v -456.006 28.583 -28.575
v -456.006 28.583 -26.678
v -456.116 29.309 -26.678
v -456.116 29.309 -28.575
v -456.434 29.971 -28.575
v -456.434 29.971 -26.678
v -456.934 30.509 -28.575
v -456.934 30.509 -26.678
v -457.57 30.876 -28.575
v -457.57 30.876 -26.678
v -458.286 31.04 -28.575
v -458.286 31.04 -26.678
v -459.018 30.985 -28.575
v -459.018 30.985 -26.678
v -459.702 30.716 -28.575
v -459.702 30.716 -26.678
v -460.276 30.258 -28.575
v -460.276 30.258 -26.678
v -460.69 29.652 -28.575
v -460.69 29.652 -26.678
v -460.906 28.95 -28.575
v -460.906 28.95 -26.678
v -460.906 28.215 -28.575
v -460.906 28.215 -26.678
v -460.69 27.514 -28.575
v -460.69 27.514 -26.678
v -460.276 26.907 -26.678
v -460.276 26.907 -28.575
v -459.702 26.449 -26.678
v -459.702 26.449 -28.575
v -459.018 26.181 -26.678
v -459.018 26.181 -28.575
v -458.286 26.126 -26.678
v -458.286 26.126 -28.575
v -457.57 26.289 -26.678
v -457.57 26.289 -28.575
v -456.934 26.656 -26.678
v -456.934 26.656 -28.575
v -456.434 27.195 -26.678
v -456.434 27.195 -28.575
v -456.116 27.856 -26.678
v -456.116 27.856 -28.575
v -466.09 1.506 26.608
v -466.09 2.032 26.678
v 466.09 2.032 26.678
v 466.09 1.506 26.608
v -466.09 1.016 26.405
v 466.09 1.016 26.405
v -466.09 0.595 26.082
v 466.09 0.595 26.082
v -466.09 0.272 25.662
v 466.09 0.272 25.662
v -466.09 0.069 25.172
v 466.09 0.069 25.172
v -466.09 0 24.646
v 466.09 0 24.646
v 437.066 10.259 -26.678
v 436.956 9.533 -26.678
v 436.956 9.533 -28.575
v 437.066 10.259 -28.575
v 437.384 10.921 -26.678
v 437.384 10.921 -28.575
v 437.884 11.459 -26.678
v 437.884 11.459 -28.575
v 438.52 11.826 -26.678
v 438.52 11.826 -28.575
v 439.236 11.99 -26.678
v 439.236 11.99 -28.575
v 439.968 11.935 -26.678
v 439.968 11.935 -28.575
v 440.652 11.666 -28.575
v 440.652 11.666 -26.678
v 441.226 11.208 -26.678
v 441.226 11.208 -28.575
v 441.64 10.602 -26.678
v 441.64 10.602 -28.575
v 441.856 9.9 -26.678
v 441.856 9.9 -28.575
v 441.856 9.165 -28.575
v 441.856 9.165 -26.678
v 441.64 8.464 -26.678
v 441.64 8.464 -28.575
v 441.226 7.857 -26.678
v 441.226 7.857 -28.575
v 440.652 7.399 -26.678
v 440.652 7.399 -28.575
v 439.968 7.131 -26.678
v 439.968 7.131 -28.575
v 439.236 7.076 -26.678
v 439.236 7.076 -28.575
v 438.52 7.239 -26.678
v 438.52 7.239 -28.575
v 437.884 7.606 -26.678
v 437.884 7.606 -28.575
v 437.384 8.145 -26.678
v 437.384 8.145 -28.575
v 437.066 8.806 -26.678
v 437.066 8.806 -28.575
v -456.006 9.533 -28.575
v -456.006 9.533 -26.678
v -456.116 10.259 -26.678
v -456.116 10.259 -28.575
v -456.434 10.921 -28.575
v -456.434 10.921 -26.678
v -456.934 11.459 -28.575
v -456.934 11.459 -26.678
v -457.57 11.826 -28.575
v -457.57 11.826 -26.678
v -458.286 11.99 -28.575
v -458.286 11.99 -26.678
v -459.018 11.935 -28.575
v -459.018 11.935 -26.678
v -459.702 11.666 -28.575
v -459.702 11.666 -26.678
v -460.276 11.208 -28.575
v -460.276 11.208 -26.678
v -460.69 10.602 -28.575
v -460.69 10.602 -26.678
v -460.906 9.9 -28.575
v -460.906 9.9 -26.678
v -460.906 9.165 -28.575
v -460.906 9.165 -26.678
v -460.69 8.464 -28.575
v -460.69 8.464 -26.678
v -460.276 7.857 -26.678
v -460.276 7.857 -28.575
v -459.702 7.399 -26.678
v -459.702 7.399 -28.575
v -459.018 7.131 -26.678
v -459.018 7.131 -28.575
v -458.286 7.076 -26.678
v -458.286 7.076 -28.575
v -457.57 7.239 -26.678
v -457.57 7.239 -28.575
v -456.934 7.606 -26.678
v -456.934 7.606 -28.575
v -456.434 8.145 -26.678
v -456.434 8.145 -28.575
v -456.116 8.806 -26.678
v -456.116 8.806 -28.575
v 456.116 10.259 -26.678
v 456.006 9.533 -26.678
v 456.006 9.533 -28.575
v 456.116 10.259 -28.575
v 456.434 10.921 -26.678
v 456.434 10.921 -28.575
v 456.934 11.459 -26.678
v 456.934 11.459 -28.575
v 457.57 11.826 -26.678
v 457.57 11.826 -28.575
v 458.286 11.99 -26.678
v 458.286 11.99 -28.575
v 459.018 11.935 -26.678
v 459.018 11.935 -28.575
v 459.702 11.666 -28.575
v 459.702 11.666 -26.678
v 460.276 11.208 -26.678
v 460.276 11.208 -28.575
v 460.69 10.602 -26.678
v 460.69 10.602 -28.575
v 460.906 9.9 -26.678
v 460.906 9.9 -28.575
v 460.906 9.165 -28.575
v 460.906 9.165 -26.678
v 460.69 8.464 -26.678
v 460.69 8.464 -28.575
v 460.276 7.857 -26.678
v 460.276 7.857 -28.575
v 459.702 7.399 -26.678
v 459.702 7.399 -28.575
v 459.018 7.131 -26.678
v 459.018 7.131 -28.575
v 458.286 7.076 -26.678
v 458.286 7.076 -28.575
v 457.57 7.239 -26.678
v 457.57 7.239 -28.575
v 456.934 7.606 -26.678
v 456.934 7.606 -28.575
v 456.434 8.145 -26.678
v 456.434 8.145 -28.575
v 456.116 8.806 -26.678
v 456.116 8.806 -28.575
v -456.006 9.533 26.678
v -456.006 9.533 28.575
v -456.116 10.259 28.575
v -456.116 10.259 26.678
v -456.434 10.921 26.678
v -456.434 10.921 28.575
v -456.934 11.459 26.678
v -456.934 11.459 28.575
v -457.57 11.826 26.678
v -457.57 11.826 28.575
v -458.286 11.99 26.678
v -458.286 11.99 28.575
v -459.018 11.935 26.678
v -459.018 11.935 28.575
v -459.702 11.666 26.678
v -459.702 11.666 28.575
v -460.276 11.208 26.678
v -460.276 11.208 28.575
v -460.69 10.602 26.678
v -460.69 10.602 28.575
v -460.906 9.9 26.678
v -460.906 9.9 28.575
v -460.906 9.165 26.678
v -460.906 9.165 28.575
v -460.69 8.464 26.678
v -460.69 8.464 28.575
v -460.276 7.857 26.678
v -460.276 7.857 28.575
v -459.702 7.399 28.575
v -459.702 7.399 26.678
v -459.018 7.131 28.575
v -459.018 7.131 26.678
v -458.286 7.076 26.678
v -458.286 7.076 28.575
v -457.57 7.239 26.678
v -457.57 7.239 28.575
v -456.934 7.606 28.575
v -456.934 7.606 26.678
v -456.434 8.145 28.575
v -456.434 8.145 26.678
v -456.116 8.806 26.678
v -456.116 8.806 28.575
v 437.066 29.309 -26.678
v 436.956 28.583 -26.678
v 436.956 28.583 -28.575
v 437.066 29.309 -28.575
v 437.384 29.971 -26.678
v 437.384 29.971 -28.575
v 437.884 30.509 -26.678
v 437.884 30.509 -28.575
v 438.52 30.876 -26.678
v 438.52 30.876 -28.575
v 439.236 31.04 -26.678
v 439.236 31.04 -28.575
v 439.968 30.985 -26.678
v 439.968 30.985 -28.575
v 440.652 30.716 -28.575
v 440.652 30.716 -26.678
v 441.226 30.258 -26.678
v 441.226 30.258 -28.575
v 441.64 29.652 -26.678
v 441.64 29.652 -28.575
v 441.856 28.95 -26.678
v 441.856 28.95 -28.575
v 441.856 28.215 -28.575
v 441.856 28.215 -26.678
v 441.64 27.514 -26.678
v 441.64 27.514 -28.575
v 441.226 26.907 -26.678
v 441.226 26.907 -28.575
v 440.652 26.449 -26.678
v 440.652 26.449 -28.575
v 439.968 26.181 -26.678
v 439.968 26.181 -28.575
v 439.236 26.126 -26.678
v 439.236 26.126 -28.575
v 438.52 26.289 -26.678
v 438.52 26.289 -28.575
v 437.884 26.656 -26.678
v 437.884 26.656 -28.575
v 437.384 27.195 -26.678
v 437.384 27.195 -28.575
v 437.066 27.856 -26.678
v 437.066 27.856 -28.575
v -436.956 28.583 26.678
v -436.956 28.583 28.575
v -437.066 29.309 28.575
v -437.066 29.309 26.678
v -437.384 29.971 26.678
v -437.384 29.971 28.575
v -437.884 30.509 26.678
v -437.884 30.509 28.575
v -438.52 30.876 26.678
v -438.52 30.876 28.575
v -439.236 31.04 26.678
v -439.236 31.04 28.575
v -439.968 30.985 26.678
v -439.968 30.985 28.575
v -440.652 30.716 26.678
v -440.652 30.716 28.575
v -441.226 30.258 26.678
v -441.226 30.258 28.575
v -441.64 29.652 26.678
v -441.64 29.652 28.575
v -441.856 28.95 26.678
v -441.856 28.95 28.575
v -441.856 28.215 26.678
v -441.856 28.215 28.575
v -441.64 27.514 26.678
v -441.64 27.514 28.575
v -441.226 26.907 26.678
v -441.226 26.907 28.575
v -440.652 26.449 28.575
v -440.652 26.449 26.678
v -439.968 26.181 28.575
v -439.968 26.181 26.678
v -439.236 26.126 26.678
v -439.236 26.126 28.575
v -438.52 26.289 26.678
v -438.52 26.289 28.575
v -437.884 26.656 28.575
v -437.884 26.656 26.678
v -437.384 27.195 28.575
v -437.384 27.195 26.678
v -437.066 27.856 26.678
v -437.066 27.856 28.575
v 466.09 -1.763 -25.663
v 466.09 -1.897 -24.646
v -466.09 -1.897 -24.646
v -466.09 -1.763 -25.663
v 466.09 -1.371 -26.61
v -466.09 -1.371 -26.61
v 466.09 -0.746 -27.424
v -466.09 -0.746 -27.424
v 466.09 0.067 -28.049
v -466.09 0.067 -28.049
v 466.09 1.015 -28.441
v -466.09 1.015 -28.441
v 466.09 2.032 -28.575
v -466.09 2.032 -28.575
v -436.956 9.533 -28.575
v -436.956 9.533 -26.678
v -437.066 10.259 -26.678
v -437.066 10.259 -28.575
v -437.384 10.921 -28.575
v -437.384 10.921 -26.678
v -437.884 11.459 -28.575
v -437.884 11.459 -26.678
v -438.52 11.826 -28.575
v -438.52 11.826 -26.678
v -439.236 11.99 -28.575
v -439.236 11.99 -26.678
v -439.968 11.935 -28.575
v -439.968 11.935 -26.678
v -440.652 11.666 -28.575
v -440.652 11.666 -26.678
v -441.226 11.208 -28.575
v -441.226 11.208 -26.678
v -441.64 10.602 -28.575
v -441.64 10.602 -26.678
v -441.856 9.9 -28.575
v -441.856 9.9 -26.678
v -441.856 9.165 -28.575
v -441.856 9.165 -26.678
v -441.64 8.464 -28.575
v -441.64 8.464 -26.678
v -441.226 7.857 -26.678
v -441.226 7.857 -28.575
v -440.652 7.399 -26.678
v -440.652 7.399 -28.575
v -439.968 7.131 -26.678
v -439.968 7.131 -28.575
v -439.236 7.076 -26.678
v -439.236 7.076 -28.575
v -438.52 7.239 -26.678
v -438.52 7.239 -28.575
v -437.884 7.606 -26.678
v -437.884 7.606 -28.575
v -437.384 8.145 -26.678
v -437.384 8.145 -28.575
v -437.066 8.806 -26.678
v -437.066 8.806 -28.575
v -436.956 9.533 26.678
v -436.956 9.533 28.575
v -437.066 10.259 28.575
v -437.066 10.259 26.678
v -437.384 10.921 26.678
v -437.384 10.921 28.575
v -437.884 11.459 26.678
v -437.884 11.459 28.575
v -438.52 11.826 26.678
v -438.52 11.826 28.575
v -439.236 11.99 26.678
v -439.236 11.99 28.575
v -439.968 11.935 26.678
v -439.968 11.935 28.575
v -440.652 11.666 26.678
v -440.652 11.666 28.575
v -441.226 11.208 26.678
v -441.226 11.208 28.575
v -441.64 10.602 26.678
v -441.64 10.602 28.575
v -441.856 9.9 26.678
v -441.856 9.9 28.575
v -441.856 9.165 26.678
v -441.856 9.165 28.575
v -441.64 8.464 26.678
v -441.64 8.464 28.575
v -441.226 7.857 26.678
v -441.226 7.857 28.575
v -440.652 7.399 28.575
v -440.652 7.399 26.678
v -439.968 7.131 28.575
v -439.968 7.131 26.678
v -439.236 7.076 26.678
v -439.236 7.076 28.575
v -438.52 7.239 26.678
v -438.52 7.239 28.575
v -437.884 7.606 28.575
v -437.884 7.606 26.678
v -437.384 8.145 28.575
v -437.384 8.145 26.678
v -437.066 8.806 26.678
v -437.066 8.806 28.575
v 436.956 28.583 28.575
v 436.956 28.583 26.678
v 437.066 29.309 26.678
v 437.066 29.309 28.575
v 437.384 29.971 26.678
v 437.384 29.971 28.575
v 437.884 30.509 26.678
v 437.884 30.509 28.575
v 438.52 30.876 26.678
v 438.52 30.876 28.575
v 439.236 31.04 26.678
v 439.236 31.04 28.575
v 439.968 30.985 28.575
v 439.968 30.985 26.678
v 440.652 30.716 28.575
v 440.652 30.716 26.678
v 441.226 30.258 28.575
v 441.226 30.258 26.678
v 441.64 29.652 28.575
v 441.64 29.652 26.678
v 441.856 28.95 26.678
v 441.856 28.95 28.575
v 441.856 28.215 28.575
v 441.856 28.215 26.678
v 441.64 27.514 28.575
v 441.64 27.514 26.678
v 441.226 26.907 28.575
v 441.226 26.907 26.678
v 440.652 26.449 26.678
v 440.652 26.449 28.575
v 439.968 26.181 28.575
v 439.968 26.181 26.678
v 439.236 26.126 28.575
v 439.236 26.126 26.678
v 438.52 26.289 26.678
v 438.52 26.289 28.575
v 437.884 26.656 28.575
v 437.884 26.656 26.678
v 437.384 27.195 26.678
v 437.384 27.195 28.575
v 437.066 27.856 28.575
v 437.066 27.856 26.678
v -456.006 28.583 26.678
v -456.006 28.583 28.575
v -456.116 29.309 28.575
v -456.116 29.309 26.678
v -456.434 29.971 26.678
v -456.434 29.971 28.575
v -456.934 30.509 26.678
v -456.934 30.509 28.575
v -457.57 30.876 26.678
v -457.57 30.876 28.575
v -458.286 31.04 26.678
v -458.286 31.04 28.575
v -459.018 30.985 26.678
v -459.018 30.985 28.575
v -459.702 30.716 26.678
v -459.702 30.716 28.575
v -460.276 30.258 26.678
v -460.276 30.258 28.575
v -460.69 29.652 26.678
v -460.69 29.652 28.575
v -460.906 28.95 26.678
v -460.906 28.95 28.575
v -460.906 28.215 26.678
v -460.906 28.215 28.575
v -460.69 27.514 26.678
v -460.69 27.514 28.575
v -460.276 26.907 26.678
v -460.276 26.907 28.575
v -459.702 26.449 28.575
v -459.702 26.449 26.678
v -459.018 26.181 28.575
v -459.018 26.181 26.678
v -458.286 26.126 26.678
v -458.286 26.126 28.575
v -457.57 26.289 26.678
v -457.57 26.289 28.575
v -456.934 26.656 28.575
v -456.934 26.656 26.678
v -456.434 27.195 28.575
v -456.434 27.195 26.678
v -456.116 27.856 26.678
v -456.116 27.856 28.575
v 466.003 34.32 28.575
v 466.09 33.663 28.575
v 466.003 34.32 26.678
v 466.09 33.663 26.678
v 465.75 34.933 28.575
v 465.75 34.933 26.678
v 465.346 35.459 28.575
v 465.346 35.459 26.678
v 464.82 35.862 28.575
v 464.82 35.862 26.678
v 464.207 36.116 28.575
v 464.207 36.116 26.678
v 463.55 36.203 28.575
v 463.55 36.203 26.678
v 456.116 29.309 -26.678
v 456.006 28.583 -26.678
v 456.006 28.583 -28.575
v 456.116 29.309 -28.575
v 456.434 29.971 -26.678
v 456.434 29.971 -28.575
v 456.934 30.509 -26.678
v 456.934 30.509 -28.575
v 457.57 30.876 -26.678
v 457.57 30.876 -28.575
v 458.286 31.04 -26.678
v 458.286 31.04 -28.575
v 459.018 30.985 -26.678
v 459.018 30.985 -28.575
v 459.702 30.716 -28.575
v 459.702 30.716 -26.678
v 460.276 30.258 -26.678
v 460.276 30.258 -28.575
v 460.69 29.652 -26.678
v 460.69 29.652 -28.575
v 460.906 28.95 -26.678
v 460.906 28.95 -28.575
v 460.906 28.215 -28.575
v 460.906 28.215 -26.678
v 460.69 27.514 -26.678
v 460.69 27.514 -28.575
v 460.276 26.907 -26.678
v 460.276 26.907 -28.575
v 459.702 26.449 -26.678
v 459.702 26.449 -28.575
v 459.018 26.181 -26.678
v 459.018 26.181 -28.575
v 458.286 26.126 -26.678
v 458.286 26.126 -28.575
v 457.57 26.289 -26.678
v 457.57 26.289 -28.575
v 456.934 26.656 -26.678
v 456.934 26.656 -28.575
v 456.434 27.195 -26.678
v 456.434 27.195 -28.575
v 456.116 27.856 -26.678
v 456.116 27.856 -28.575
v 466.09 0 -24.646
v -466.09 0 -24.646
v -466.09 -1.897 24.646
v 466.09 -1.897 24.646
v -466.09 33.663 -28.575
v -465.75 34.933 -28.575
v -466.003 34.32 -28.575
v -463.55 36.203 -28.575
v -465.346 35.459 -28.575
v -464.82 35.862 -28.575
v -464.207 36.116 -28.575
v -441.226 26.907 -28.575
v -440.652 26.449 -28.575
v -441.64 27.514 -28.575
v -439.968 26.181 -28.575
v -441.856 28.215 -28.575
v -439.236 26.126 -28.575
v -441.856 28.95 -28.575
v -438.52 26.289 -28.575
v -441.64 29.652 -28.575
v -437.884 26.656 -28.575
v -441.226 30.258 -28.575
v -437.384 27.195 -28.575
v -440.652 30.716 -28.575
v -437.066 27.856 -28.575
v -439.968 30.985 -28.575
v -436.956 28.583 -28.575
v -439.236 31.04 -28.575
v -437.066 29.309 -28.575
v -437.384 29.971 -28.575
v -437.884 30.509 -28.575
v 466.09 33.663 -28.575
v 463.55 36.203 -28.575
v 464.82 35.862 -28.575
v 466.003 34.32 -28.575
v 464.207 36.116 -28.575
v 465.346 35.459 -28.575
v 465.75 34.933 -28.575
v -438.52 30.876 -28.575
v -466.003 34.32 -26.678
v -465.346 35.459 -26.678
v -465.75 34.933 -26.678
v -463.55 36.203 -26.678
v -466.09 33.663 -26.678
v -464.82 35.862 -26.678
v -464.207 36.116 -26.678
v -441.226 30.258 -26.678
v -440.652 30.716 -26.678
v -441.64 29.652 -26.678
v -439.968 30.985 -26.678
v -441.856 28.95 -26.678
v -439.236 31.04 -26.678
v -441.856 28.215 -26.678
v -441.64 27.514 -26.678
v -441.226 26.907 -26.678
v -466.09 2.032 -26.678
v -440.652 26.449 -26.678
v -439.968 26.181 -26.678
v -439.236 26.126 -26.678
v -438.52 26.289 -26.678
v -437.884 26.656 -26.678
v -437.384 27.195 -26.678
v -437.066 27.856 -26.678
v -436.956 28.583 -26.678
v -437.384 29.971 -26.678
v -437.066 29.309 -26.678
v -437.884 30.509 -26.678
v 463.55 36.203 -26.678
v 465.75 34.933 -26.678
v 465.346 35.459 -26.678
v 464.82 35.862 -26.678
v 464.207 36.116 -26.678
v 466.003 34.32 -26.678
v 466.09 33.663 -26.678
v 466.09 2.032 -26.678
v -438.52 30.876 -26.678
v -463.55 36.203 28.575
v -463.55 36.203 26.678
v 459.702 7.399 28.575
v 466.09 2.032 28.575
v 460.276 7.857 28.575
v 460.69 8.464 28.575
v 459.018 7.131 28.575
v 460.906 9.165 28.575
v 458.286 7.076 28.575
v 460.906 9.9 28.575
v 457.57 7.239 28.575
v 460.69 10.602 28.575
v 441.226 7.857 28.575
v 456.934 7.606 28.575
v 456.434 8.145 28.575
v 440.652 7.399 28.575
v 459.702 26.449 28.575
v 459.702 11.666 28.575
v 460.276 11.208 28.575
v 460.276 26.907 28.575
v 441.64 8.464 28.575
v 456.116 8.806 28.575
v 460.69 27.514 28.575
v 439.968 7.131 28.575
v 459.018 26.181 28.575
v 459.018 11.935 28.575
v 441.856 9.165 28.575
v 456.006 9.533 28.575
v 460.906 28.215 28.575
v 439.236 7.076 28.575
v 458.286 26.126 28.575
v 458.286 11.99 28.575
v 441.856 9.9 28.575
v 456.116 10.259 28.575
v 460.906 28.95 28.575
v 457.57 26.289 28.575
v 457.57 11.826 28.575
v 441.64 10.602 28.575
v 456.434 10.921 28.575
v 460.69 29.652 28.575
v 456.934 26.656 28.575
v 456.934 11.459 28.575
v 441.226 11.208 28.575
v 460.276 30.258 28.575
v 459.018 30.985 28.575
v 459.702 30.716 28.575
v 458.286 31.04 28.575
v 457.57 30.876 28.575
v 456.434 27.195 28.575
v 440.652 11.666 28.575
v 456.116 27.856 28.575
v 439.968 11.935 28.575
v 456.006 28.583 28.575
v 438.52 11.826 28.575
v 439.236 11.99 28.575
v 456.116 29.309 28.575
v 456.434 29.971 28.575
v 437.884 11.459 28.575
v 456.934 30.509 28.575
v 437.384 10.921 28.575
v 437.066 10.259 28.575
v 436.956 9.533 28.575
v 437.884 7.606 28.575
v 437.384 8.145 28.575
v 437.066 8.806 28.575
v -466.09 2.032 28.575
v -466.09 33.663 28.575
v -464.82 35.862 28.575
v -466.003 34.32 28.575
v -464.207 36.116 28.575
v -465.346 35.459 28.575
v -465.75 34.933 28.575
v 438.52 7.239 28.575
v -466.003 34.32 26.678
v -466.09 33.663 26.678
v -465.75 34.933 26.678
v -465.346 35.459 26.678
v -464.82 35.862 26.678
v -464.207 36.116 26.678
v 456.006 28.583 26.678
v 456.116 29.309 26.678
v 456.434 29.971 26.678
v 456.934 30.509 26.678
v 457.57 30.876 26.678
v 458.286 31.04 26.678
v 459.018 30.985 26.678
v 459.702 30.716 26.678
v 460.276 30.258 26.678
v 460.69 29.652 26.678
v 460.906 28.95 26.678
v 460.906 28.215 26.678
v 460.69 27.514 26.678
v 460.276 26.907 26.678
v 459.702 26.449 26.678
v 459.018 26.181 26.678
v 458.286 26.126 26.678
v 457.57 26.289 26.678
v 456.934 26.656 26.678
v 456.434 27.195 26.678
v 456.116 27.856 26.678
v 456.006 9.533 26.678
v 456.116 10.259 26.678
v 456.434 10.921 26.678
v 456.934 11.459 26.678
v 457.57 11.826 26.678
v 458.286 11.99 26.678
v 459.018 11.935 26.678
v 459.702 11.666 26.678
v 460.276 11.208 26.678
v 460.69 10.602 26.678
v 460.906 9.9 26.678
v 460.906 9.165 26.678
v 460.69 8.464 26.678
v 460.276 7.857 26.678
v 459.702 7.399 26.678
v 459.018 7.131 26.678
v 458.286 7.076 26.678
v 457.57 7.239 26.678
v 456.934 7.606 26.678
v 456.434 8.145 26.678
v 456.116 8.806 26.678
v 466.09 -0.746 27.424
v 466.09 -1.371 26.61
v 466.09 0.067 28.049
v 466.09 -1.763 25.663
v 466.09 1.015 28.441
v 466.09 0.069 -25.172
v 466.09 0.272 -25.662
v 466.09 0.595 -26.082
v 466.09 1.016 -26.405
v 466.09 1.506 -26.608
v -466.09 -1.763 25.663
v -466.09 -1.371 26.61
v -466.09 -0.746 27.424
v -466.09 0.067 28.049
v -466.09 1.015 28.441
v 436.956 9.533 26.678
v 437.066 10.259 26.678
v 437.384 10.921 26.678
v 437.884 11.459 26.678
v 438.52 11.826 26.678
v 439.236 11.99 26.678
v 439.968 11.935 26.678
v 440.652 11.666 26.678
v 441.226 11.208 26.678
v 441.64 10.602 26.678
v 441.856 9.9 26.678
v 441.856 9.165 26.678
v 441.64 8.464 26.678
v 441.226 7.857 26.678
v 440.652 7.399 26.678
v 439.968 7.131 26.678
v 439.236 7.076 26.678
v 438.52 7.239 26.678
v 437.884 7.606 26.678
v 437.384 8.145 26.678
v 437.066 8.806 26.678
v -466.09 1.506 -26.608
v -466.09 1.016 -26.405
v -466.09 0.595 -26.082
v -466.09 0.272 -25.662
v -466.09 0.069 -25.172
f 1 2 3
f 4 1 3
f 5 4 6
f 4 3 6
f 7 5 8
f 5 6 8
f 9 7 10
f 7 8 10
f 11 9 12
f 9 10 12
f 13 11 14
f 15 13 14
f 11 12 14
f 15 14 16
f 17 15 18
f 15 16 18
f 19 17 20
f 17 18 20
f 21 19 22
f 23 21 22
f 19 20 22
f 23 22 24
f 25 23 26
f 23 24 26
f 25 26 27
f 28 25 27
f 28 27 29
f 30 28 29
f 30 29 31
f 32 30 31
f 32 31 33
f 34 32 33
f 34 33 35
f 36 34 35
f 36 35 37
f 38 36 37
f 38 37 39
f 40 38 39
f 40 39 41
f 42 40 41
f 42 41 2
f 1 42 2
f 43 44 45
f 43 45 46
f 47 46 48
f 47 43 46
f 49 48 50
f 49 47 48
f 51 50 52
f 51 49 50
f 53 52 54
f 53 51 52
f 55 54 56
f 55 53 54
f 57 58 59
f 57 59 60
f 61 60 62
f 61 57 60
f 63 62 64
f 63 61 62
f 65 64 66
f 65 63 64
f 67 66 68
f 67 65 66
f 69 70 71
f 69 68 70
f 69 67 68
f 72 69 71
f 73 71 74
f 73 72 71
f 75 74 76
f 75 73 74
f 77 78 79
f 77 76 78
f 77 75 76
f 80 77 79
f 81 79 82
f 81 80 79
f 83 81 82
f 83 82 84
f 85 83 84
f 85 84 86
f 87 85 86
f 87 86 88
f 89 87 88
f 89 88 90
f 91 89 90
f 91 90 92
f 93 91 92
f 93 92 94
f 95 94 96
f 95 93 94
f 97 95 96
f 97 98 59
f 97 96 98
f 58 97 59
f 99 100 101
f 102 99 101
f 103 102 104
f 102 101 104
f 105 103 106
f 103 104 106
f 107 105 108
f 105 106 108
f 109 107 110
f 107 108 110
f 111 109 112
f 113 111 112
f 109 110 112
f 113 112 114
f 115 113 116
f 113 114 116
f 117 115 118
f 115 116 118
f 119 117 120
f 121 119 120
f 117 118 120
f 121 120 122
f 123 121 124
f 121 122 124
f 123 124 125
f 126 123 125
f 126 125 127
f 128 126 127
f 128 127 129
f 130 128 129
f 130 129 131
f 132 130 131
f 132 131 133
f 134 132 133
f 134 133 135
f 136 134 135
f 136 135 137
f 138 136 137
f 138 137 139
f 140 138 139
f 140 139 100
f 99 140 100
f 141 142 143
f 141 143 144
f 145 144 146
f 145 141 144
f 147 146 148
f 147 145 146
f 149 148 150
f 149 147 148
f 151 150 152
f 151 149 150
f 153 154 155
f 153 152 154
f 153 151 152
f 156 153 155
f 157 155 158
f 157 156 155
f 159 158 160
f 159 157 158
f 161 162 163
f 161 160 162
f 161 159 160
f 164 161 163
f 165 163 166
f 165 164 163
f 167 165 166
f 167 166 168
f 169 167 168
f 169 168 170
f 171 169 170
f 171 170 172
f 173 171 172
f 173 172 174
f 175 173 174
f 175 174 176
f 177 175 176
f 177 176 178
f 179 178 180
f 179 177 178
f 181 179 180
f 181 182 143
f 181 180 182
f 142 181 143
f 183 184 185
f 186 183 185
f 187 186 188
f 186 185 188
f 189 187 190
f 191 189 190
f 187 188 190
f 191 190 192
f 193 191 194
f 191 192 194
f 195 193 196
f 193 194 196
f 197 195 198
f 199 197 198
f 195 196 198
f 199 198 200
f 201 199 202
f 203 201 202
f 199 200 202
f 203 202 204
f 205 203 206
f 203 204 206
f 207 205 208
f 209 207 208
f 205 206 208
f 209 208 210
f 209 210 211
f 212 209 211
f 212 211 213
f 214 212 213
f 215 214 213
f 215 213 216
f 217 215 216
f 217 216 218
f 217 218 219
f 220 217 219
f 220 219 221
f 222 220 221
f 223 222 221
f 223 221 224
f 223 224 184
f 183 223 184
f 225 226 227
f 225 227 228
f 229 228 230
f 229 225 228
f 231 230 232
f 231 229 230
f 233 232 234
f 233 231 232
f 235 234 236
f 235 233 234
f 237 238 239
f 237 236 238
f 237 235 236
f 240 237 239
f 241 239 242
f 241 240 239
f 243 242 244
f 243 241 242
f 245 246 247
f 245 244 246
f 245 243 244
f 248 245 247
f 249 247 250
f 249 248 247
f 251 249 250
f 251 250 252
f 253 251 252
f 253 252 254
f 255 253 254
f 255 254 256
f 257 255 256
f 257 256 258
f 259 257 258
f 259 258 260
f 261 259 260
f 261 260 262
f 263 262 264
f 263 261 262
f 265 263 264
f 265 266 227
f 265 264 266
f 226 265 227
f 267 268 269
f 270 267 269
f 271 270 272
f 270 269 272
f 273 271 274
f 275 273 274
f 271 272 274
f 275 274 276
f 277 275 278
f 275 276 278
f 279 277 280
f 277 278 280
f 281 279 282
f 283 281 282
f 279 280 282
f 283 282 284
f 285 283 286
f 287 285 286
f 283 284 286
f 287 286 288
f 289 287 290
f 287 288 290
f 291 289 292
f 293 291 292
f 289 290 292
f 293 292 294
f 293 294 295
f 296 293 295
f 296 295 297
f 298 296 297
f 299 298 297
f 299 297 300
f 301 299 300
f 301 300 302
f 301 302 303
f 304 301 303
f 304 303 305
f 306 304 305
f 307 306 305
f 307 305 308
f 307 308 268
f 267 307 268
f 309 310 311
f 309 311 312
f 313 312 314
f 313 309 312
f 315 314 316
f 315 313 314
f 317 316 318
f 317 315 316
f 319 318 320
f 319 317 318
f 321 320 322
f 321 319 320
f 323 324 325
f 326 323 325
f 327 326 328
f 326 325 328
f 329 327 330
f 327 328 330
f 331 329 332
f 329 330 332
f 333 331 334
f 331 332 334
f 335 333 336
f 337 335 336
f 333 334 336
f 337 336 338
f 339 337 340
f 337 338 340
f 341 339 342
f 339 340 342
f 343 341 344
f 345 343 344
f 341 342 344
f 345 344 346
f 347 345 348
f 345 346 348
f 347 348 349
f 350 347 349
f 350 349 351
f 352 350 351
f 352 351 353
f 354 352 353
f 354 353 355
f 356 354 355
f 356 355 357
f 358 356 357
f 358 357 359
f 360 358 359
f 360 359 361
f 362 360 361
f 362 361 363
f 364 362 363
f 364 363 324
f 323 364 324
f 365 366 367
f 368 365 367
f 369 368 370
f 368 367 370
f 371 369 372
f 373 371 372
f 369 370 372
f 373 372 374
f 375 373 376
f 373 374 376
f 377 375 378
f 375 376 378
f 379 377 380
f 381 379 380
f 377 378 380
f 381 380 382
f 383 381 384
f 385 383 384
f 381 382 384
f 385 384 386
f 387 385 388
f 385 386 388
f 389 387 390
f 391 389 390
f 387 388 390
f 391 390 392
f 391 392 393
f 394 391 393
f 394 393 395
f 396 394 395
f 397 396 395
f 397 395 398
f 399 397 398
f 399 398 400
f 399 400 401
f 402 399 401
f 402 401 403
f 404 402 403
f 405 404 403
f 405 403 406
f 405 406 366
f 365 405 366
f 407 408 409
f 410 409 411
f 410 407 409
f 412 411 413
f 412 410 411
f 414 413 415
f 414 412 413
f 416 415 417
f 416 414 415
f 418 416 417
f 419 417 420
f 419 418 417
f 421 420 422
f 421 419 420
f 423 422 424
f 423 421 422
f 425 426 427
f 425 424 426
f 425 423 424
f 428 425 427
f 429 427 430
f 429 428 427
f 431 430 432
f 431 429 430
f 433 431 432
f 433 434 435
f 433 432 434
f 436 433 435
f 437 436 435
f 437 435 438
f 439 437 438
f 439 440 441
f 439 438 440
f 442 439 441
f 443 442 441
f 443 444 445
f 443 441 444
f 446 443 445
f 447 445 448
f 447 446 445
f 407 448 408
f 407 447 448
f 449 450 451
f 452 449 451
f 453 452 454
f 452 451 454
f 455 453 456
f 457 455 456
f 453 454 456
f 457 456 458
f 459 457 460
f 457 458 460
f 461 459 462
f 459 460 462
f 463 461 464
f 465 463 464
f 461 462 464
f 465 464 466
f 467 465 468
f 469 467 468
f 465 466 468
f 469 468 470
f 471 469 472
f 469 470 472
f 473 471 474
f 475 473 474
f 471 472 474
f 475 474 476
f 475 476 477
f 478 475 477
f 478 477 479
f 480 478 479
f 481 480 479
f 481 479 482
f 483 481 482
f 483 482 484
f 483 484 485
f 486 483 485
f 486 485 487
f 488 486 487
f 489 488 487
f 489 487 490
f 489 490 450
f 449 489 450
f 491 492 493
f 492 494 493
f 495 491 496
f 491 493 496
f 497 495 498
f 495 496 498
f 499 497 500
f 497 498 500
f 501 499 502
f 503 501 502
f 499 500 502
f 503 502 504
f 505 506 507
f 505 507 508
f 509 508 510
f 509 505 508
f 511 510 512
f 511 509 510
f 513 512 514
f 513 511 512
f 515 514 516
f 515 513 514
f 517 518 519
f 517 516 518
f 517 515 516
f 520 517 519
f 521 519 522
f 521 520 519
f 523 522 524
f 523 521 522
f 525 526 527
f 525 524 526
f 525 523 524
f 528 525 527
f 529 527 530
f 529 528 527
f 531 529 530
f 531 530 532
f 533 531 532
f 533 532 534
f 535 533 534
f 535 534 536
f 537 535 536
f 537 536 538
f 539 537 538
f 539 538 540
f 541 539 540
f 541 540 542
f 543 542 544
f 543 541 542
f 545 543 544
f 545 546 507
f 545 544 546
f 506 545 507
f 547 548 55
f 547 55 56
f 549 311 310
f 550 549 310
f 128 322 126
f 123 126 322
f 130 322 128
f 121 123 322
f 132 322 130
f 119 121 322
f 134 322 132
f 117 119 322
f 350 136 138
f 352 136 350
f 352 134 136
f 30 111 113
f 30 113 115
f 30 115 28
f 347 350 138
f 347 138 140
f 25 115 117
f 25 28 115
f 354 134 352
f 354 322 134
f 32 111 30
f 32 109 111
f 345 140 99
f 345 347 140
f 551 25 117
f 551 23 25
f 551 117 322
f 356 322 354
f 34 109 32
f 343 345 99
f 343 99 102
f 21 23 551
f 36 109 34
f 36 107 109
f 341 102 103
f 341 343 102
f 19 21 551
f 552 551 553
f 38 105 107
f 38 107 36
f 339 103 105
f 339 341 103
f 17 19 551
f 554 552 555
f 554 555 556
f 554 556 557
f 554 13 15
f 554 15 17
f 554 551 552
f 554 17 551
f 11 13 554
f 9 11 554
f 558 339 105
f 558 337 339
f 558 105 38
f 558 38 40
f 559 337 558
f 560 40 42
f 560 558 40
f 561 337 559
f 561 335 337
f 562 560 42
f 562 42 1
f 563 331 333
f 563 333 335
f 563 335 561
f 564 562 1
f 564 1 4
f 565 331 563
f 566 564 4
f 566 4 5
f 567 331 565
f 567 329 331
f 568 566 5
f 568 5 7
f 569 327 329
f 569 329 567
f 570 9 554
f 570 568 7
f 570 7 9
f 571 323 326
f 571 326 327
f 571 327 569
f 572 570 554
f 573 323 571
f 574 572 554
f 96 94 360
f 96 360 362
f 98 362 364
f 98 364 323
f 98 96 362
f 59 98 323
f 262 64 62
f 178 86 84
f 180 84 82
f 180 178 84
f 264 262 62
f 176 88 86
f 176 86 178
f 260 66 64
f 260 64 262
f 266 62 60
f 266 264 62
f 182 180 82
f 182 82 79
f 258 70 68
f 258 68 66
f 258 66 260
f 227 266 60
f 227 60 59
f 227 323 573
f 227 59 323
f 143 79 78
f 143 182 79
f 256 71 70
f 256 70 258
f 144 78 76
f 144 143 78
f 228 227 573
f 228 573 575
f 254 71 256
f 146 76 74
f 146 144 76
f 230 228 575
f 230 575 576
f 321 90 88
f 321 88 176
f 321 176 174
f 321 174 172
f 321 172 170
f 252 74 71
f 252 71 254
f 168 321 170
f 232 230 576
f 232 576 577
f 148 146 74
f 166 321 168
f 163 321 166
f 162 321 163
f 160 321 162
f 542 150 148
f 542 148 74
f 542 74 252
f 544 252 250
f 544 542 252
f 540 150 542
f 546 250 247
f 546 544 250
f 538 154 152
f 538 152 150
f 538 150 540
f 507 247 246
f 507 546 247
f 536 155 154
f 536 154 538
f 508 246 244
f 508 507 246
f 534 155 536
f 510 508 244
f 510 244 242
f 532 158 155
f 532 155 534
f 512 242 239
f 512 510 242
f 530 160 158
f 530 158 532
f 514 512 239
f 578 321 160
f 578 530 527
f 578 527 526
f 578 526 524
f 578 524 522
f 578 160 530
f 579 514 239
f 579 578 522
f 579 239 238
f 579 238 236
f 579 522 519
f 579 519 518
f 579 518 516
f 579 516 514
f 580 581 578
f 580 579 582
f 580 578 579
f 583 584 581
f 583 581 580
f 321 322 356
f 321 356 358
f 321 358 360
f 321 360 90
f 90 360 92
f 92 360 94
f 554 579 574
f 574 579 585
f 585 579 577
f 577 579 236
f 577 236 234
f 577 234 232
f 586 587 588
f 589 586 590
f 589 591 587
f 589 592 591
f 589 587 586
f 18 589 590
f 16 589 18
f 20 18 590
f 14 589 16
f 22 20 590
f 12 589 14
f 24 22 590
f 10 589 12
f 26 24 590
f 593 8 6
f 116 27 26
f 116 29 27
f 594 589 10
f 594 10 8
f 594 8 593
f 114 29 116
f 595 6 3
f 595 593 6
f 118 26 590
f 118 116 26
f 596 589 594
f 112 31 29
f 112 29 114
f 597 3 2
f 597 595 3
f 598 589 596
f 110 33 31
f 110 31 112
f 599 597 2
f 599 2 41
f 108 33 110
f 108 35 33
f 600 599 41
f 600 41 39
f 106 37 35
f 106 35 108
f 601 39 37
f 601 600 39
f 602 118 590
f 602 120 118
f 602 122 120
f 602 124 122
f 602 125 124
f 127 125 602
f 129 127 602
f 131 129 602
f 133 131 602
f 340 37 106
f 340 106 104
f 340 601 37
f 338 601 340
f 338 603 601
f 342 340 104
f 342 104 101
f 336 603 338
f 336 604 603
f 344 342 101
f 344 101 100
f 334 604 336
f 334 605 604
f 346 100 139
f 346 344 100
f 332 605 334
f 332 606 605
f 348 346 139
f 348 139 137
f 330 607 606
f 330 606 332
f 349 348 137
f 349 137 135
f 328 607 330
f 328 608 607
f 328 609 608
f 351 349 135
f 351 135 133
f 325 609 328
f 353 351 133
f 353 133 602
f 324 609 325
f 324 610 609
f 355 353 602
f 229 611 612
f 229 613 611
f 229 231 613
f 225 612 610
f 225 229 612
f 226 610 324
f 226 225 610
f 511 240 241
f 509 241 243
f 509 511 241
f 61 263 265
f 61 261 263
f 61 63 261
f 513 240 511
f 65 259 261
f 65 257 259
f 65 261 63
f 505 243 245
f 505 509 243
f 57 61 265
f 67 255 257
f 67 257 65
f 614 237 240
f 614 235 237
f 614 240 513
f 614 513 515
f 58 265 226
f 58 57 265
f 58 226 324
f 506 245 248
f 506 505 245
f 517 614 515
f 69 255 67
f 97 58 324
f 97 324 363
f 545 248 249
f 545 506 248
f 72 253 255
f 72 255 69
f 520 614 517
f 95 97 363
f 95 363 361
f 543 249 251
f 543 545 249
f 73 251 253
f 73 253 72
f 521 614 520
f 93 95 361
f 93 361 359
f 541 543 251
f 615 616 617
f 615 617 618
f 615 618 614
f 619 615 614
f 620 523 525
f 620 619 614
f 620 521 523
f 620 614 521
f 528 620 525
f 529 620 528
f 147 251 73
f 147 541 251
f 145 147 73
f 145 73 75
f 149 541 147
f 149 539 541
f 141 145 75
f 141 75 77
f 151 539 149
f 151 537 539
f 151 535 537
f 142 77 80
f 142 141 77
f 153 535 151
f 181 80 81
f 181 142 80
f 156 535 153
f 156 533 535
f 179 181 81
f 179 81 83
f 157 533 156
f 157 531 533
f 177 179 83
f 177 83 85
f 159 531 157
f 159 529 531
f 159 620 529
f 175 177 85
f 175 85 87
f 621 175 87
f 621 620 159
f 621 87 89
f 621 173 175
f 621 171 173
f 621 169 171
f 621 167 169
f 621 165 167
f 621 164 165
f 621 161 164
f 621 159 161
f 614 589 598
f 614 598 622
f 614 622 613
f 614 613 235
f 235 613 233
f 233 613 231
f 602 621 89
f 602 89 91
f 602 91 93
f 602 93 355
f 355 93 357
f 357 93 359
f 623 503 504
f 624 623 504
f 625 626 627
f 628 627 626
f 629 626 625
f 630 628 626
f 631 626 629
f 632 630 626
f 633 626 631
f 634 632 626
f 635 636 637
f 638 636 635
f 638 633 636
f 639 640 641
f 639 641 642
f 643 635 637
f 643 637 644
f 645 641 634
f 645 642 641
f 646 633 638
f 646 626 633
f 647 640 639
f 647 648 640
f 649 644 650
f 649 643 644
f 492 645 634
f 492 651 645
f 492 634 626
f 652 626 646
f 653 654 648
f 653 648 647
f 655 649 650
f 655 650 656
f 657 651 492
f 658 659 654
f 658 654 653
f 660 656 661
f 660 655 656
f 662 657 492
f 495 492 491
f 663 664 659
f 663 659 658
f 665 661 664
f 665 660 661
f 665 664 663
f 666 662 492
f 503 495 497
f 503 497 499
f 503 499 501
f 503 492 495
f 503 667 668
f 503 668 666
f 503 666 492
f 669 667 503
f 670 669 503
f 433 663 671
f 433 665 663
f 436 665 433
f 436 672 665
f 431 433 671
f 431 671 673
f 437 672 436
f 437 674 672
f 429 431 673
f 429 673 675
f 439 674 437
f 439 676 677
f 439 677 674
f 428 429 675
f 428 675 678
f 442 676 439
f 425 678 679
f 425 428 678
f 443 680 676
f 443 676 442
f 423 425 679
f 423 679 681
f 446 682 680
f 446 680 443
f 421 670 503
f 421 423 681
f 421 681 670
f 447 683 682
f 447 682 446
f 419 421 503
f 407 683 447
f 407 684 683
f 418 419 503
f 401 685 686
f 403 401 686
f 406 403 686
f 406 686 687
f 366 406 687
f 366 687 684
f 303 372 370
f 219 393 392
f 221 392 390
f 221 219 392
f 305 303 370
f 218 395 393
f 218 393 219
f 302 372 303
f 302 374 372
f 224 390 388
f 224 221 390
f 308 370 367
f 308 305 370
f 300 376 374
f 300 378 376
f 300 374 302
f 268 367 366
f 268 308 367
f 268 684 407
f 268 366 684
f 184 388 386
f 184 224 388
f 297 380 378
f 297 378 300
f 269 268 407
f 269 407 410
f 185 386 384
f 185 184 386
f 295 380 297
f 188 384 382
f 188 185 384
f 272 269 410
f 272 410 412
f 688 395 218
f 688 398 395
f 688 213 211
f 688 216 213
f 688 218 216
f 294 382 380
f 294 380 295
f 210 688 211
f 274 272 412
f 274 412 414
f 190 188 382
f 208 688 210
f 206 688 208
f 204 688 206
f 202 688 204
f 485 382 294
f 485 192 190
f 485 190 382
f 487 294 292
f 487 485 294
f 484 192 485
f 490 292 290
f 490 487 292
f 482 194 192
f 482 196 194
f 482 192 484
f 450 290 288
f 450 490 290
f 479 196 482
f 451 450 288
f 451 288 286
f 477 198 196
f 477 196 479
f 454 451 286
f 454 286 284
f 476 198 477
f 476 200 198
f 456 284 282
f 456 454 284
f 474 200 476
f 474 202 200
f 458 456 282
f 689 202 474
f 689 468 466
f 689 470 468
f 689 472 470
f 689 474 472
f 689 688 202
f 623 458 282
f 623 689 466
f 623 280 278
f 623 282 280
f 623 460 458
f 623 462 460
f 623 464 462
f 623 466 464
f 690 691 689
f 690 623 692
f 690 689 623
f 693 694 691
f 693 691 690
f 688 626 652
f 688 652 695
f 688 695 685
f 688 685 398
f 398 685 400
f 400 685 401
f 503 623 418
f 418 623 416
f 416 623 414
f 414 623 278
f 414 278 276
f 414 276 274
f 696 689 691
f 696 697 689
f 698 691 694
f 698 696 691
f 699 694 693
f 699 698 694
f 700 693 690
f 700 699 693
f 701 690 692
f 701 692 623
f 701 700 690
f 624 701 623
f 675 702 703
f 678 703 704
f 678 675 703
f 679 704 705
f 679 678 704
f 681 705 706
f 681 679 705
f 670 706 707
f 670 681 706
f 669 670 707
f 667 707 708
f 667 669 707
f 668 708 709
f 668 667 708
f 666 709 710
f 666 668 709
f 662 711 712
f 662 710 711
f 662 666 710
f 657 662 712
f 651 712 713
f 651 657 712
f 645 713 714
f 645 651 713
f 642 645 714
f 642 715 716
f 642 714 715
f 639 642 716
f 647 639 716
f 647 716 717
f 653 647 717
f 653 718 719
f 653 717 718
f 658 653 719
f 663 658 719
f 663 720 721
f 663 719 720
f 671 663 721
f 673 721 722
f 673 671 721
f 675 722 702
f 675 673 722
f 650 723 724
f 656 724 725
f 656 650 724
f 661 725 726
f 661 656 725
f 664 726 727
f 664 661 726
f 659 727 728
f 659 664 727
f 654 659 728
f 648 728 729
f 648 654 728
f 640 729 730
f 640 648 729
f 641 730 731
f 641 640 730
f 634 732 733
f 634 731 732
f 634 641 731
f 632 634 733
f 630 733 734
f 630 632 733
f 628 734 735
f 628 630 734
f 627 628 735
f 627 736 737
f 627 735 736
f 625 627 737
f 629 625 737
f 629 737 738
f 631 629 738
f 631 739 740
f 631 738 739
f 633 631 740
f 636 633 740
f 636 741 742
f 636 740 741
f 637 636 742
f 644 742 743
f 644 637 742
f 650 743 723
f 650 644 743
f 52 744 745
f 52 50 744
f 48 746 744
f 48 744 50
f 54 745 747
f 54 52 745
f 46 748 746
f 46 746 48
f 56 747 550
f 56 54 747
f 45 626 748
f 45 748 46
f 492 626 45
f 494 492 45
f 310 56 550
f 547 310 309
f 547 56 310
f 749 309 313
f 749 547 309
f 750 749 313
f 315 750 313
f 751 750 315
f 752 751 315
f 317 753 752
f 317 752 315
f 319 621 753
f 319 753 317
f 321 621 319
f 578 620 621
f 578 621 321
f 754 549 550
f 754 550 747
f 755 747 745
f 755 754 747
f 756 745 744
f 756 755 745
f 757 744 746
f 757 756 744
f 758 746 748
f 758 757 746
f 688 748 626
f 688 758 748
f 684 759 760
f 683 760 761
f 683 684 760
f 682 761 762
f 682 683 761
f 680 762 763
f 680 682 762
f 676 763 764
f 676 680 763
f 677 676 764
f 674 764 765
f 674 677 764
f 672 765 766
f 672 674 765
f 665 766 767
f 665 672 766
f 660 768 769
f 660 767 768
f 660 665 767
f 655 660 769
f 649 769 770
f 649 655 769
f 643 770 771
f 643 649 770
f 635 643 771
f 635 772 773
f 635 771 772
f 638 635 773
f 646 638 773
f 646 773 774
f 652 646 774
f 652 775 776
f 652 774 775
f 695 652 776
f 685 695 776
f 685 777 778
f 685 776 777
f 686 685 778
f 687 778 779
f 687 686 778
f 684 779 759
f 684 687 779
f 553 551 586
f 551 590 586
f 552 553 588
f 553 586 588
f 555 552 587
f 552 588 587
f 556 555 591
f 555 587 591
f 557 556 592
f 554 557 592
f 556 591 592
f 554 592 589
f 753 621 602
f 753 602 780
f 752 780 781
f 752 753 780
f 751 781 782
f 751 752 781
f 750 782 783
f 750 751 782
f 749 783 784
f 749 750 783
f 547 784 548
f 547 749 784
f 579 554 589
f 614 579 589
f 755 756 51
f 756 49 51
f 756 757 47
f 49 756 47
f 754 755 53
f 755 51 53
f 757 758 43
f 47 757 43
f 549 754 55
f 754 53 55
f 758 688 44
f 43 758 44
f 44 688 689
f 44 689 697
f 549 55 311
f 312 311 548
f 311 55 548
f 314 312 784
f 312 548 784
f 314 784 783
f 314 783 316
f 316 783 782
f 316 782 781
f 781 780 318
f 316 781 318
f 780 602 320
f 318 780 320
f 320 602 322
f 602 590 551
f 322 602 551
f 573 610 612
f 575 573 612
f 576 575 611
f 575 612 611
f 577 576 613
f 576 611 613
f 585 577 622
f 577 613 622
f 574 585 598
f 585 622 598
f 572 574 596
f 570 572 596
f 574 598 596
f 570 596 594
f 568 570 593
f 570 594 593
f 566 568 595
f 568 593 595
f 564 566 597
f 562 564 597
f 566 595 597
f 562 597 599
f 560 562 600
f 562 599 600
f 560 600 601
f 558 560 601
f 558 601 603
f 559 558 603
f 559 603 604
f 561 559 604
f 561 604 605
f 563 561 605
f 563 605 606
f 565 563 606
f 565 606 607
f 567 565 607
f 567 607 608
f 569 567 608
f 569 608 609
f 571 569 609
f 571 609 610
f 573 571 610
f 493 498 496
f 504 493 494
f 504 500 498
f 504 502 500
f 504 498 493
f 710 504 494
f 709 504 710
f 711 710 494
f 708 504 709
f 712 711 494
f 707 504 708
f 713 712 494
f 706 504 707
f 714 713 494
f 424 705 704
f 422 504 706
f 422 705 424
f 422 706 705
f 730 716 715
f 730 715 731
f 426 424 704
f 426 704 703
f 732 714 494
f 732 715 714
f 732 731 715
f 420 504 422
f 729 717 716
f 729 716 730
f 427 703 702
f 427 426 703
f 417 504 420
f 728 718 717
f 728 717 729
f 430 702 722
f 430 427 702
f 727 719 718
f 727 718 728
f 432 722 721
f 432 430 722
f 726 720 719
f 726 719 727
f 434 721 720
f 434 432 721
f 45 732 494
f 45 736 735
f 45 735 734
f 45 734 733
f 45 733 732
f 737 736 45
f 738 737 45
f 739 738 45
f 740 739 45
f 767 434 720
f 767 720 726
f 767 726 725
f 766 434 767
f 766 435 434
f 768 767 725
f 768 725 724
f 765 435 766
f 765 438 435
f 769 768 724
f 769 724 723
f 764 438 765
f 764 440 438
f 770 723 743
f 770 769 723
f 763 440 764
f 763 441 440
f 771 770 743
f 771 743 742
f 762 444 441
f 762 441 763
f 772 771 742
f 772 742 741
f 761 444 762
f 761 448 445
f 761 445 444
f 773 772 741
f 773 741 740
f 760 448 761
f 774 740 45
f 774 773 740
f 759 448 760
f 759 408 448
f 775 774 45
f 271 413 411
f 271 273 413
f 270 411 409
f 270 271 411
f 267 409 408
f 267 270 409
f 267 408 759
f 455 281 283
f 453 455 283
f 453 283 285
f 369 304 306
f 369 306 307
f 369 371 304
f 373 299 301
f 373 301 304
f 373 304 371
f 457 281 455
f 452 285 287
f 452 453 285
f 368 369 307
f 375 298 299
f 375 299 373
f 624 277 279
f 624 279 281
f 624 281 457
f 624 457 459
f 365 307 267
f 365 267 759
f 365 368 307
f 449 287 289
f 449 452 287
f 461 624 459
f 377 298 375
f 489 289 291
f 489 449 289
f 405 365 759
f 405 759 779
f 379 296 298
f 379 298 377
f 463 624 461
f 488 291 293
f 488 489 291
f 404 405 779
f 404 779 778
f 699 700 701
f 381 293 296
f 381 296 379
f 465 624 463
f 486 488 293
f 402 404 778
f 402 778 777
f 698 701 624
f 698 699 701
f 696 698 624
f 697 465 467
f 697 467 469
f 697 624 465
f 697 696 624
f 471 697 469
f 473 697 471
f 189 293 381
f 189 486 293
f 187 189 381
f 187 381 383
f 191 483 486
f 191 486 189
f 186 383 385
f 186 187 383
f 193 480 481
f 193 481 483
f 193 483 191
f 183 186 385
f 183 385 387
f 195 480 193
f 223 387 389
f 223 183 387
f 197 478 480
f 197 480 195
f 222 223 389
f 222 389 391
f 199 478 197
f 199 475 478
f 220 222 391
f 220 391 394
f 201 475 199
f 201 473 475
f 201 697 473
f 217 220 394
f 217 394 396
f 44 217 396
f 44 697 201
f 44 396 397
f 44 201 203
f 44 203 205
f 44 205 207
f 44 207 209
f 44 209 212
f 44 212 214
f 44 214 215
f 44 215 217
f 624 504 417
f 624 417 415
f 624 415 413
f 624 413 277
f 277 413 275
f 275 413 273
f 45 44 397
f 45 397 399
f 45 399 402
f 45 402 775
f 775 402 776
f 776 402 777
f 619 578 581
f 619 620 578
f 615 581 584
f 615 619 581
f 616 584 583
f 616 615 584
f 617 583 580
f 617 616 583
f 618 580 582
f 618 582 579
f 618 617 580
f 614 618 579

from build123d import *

# Parameters (mm, degrees)
SKETCH1_W                    = 932.18
SKETCH1_H                    = 57.15
BASE_FLANGE1_DEPTH           = 1.89738
EDGE_FLANGE1_STRIP_W         = 11.65352
EDGE_FLANGE1_STRIP_H         = 1.89738
EDGE_FLANGE1_STRIP_CUT_DEPTH = 932.18
EDGE_FLANGE1_DEPTH           = 932.18
EDGE_FLANGE2_STRIP_W         = 11.65352
EDGE_FLANGE2_STRIP_H         = 1.89738
EDGE_FLANGE2_STRIP_CUT_DEPTH = 932.18
EDGE_FLANGE2_DEPTH           = 932.18
SKETCH12_R                   = 2.4638
CUT_EXTRUDE1_DEPTH           = 471.97413973
FILLET1_R                    = 2.54


# Sheet-metal steps are written as plain solids
with BuildPart() as part:
    # Sketch1 → Base-Flange1 (new body)
    with BuildSketch(Plane(origin=(0, 0, 0), x_dir=(1, 0, 0), z_dir=(0, 1, 0))):
        Rectangle(SKETCH1_W, SKETCH1_H)
    extrude(amount=-BASE_FLANGE1_DEPTH)

    # Edge-Flange1 strip (across the edge) → Edge-Flange1 strip cut (cut)
    with BuildSketch(Plane(origin=(-466.09, 0, 28.575), x_dir=(0, 0, -1), z_dir=(1, 0, 0))):
        with Locations((-1.89738, -0.94869)):
            Rectangle(EDGE_FLANGE1_STRIP_W, EDGE_FLANGE1_STRIP_H)
    extrude(amount=EDGE_FLANGE1_STRIP_CUT_DEPTH, mode=Mode.SUBTRACT)

    # Edge-Flange1 section (across the edge) → Edge-Flange1 (add)
    with BuildSketch(Plane(origin=(-466.09, 0, 28.575), x_dir=(0, 0, -1), z_dir=(1, 0, 0))):
        with BuildLine():
            Line((0, 2.032), (0, 36.20262))
            Line((0, 36.20262), (1.89738, 36.20262))
            Line((1.89738, 36.20262), (1.89738, 2.032))
            ThreePointArc((1.89738, 2.032), (2.492539021, 0.595159021), (3.92938, 0))
            Line((3.92938, 0), (3.92938, -1.89738))
            ThreePointArc((3.92938, -1.89738), (1.150888756, -0.746491244), (0, 2.032))
        make_face()
    extrude(amount=EDGE_FLANGE1_DEPTH)

    # Edge-Flange2 strip (across the edge) → Edge-Flange2 strip cut (cut)
    with BuildSketch(Plane(origin=(466.09, 0, -28.575), x_dir=(0, 0, 1), z_dir=(-1, 0, 0))):
        with Locations((-1.89738, -0.94869)):
            Rectangle(EDGE_FLANGE2_STRIP_W, EDGE_FLANGE2_STRIP_H)
    extrude(amount=EDGE_FLANGE2_STRIP_CUT_DEPTH, mode=Mode.SUBTRACT)

    # Edge-Flange2 section (across the edge) → Edge-Flange2 (add)
    with BuildSketch(Plane(origin=(466.09, 0, -28.575), x_dir=(0, 0, 1), z_dir=(-1, 0, 0))):
        with BuildLine():
            Line((0, 2.032), (0, 36.20262))
            Line((0, 36.20262), (1.89738, 36.20262))
            Line((1.89738, 36.20262), (1.89738, 2.032))
            ThreePointArc((1.89738, 2.032), (2.492539021, 0.595159021), (3.92938, 0))
            Line((3.92938, 0), (3.92938, -1.89738))
            ThreePointArc((3.92938, -1.89738), (1.150888756, -0.746491244), (0, 2.032))
        make_face()
    extrude(amount=EDGE_FLANGE2_DEPTH)

    # Sketch12 → Cut-Extrude1 (cut, through all)
    with BuildSketch(Plane.XY.offset(28.575)):
        with Locations((-458.47, 28.58262)):
            Circle(SKETCH12_R)
        with Locations((-458.47, 9.53262)):
            Circle(SKETCH12_R)
        with Locations((-439.42, 28.58262)):
            Circle(SKETCH12_R)
        with Locations((-439.42, 9.53262)):
            Circle(SKETCH12_R)
    cut_extrude1 = extrude(amount=-CUT_EXTRUDE1_DEPTH, mode=Mode.SUBTRACT)

    # Mirror1: Cut-Extrude1 across plane
    add(cut_extrude1.mirror(Plane(origin=(0, 0, 0), x_dir=(0, 0, 1), z_dir=(1, 0, 0))), mode=Mode.SUBTRACT)

    # Fillet1
    fillet1_edges = [part.edges().sort_by_distance(p)[0] for p in [
        (-466.09, 36.20262, 27.62631),
        (466.09, 36.20262, 27.62631),
        (466.09, 36.20262, -27.62631),
        (-466.09, 36.20262, -27.62631),
    ]]
    fillet(fillet1_edges, radius=FILLET1_R)


solid = part.part
